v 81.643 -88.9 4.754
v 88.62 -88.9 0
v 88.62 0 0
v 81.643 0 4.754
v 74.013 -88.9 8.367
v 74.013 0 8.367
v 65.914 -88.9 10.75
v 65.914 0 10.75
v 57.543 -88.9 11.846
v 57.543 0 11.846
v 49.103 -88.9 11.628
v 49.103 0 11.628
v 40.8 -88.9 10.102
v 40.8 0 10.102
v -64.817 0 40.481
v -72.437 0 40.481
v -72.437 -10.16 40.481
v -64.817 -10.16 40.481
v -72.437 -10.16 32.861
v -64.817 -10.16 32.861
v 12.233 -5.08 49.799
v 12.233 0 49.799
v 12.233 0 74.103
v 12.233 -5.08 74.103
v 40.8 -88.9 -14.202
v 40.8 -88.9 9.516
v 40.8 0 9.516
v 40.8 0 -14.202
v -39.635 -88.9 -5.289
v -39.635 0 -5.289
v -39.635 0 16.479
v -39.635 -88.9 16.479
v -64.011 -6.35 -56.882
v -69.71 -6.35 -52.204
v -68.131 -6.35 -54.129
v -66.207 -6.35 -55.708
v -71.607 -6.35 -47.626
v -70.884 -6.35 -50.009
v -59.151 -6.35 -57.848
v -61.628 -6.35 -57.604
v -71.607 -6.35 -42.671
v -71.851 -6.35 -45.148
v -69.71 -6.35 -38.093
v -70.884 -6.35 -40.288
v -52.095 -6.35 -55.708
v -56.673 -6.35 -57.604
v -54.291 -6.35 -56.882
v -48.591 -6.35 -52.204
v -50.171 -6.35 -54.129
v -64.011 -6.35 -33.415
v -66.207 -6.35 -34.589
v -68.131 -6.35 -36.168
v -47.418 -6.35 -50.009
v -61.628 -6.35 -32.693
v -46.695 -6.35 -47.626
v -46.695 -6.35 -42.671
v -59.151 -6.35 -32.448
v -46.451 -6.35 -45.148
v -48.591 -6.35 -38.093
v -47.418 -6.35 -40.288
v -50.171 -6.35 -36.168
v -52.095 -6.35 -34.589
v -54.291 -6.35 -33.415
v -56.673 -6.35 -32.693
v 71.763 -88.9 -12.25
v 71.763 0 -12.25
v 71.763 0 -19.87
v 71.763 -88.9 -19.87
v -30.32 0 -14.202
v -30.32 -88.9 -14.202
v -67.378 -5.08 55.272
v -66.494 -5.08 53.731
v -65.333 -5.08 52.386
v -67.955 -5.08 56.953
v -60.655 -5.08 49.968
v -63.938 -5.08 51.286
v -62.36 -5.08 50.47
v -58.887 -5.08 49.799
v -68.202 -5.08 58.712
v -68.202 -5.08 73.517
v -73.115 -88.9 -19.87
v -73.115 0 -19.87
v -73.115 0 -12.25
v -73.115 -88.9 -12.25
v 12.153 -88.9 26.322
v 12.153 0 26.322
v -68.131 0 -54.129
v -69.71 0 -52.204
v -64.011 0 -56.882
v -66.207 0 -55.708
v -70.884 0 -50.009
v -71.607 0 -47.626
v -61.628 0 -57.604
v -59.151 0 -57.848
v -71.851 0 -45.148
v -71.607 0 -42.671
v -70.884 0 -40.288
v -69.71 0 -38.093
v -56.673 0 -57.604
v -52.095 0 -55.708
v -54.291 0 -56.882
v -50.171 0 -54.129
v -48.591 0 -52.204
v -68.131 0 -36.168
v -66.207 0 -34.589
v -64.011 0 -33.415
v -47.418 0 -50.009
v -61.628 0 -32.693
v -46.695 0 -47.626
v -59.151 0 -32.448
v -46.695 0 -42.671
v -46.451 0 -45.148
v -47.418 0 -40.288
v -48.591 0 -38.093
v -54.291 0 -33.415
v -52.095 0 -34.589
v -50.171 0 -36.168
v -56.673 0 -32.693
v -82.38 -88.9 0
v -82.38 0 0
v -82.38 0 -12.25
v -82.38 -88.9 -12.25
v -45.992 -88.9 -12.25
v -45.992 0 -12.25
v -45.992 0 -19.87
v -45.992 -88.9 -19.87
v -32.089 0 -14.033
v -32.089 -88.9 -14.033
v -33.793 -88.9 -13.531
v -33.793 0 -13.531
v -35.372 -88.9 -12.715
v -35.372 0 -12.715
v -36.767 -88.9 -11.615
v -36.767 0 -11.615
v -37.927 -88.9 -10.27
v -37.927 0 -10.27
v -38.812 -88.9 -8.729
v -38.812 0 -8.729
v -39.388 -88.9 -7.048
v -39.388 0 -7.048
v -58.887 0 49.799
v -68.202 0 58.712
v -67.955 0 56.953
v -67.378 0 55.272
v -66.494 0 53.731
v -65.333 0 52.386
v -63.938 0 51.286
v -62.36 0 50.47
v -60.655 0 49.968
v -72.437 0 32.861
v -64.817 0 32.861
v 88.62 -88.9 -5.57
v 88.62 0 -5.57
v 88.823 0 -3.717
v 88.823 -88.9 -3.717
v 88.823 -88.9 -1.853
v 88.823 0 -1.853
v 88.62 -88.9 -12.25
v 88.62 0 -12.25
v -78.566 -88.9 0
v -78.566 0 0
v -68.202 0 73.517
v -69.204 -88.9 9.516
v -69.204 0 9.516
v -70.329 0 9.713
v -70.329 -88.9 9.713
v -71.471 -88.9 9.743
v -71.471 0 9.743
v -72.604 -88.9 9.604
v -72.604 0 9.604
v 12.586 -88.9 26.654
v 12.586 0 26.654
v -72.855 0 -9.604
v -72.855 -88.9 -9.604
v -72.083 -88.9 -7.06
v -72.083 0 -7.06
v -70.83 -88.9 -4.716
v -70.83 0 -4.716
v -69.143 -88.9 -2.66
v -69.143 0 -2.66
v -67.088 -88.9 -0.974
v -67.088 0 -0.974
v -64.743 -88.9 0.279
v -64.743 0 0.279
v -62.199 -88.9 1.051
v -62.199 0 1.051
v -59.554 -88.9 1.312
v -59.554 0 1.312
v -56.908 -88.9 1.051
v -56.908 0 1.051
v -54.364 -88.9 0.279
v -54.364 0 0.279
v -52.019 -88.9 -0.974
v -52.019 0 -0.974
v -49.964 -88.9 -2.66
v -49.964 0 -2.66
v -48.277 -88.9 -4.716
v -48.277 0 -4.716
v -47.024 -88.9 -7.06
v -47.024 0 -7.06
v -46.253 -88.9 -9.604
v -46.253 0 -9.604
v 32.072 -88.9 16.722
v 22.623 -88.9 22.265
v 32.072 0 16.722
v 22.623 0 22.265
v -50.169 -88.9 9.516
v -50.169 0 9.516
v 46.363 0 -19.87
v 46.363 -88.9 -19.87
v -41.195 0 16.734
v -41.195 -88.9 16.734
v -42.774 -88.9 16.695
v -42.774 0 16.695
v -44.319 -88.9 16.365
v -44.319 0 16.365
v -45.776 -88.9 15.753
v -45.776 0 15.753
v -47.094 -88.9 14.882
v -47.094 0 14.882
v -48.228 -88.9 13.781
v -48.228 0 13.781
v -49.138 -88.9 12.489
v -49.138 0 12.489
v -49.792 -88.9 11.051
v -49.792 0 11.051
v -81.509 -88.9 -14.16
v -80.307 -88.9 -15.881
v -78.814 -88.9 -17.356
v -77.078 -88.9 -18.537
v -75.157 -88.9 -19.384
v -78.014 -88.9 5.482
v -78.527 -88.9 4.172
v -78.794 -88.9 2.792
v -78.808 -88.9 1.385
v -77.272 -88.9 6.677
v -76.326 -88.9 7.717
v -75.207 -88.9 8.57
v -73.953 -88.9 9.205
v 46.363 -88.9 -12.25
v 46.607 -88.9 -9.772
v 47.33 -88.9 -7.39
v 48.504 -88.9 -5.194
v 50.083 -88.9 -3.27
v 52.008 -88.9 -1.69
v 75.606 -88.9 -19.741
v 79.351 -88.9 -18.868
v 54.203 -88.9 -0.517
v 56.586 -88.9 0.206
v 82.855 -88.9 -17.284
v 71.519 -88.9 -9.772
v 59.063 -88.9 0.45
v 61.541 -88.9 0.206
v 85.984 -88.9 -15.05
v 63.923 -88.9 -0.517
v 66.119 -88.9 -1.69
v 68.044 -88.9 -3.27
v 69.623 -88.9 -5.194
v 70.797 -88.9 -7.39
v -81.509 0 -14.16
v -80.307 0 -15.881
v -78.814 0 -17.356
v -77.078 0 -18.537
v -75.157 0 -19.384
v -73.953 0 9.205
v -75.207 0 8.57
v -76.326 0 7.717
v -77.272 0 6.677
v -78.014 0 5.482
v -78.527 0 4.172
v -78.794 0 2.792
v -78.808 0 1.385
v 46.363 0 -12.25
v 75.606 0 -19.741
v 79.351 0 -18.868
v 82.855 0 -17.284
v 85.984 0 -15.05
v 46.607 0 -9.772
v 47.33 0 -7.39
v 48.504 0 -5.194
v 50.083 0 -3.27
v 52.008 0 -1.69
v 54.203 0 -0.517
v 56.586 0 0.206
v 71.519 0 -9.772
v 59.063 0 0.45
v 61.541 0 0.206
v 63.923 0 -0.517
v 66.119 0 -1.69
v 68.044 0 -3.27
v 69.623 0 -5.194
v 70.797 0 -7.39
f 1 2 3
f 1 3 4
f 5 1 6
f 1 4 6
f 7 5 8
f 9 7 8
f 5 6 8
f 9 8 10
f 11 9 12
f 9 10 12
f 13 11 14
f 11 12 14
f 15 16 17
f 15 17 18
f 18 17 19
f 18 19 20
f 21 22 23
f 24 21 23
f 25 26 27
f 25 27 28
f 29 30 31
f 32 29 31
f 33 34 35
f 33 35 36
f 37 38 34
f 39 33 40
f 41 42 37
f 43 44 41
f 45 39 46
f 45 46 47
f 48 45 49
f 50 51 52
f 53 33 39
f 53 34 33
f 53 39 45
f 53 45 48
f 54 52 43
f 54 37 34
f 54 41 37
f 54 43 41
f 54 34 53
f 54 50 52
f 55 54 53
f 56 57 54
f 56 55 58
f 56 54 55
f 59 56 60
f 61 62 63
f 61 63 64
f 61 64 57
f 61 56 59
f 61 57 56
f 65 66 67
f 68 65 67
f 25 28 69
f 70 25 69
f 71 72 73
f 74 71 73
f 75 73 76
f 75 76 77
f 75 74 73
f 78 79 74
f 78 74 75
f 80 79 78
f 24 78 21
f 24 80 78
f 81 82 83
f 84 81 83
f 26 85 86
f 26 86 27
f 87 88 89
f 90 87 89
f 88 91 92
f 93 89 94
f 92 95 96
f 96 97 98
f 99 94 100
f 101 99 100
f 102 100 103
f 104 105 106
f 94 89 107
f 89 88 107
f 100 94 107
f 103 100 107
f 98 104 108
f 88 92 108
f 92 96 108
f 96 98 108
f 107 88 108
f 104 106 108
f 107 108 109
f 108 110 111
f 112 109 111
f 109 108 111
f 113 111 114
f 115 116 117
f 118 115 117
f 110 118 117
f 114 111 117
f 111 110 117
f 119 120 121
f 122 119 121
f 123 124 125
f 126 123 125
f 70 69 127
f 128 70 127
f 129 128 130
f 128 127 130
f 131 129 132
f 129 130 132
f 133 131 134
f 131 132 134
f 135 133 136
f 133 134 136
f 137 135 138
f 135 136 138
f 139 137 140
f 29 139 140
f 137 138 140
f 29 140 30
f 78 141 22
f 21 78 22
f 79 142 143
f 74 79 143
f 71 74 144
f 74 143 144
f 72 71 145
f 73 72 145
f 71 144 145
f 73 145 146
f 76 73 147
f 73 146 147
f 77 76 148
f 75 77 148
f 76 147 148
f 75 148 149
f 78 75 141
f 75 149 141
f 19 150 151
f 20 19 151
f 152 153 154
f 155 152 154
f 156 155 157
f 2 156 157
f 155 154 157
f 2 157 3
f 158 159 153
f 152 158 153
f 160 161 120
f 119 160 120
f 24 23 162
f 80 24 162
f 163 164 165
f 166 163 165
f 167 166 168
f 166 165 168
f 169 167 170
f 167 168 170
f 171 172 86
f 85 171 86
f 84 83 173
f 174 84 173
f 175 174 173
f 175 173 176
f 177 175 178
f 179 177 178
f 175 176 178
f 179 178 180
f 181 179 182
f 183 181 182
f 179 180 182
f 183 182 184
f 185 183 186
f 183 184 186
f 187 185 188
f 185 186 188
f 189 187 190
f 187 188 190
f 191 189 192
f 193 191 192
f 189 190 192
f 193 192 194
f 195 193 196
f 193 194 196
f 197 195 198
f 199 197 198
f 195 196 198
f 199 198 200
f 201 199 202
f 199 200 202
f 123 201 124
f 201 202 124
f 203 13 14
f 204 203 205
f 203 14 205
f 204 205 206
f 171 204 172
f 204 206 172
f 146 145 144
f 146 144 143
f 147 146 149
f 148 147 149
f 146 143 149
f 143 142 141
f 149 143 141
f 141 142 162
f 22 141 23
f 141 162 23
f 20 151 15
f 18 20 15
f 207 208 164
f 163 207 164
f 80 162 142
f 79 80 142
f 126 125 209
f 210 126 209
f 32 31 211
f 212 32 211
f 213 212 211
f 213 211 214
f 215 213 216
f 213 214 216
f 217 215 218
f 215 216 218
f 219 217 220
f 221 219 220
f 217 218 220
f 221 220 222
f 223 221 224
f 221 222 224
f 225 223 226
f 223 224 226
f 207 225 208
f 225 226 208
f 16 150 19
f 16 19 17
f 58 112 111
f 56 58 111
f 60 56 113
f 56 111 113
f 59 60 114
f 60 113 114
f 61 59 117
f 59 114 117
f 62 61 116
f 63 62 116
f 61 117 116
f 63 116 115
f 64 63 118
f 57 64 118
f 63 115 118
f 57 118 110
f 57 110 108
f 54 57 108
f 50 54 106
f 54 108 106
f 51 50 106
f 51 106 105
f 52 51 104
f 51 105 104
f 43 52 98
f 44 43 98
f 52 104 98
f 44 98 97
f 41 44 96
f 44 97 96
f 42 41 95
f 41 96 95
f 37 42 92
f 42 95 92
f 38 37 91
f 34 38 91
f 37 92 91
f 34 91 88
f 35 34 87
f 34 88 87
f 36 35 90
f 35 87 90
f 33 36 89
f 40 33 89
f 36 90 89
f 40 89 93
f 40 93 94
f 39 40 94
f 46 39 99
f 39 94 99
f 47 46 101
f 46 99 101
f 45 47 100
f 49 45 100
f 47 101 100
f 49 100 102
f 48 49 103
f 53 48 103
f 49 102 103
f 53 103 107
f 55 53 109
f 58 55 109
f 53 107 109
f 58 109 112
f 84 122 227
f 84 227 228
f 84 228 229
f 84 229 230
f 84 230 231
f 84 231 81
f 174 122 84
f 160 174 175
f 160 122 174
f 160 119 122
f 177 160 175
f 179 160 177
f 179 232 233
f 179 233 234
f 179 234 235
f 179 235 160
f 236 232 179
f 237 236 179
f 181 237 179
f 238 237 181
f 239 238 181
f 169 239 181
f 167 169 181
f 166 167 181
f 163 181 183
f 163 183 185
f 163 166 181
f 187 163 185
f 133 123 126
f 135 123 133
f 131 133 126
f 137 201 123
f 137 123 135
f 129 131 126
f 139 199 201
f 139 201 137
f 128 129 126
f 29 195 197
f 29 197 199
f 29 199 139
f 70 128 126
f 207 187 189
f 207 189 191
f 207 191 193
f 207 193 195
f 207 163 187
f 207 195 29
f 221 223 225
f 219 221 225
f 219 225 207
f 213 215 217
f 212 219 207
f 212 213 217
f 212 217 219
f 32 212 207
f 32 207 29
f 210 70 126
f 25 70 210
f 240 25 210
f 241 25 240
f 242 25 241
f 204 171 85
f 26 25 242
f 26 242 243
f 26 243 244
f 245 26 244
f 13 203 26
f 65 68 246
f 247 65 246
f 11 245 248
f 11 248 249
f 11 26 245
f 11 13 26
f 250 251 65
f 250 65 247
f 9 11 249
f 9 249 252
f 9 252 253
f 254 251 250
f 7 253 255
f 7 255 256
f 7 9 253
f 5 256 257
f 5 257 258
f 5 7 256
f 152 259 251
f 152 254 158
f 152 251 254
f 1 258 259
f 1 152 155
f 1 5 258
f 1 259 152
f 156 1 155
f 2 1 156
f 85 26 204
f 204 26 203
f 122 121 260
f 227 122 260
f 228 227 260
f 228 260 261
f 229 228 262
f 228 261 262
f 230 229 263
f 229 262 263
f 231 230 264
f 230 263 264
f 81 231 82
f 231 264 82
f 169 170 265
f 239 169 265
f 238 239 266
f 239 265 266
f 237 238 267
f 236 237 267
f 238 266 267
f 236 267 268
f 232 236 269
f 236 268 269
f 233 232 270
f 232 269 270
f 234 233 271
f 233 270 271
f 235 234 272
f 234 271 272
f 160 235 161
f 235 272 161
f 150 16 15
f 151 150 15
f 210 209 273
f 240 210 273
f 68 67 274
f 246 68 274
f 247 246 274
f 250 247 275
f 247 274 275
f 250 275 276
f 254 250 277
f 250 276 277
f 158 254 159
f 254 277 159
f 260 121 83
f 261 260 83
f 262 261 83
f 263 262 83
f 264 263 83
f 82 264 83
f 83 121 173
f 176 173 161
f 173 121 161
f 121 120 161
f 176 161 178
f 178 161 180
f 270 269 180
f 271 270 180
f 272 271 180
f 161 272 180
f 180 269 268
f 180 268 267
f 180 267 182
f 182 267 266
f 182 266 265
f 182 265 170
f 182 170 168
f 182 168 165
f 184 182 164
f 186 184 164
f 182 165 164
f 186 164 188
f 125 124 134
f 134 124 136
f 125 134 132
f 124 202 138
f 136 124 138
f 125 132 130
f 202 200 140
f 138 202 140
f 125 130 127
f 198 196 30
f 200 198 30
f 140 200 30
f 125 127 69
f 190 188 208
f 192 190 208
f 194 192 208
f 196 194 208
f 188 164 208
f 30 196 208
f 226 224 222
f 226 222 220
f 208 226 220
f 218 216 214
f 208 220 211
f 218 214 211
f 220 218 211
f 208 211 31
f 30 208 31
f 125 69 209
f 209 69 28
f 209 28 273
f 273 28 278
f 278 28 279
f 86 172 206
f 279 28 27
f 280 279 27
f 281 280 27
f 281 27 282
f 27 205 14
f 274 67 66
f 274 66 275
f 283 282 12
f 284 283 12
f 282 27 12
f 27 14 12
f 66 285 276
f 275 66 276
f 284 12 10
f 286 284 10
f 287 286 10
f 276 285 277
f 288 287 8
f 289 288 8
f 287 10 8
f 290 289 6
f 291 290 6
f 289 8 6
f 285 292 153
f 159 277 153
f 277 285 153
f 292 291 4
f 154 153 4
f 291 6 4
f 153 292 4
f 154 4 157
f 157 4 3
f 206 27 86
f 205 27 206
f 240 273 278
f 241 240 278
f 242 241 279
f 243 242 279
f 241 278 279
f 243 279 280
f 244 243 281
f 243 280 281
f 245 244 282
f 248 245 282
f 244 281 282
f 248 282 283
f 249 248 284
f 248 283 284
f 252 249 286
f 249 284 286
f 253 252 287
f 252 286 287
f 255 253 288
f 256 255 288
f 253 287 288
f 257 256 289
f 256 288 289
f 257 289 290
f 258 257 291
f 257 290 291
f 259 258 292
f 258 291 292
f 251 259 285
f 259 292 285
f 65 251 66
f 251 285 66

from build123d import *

# Parameters (mm, degrees)
F1_DEPTH = 88.9
F3_DEPTH = 5.08
F4_R     = 12.7
F5_DEPTH = 6.35
F6_W     = 7.62
F6_H     = 7.62
F7_DEPTH = 10.16


with BuildPart() as f1:
    # F0 (on Front) → F1 (new body)
    with BuildSketch(Plane.XZ):
        with BuildLine():
            ThreePointArc((-82.37978, -12.250033), (-78.813533, -17.356135), (-73.115226, -19.870033))
            Line((-73.115226, -19.870033), (-73.115226, -12.250033))
            ThreePointArc((-73.115226, -12.250033), (-59.553572, 1.31162), (-45.991919, -12.250033))
            Line((-45.991919, -12.250033), (-45.991919, -19.870033))
            Line((-45.991919, -19.870033), (46.363413, -19.870033))
            Line((46.363413, -19.870033), (46.363413, -12.250033))
            ThreePointArc((46.363413, -12.250033), (59.063413, 0.449967), (71.763413, -12.250033))
            Line((71.763413, -12.250033), (71.763413, -19.870033))
            ThreePointArc((71.763413, -19.870033), (81.14185, -18.161995), (88.619895, -12.250033))
            Line((88.619895, -12.250033), (88.619895, -5.570058))
            Line((88.619895, -5.570058), (88.619895, 0))
            ThreePointArc((88.619895, 0), (65.913754, 10.749941), (40.7998, 10.102283))
            Line((40.7998, 10.102283), (40.7998, 9.51627))
            Line((40.7998, 9.51627), (40.7998, -14.202342))
            Line((40.7998, -14.202342), (-30.3202, -14.202342))
            ThreePointArc((-30.3202, -14.202342), (-36.766504, -11.614961), (-39.635142, -5.288801))
            Line((-39.635142, -5.288801), (-39.635142, 9.51627))
            Line((-39.635142, 9.51627), (-50.168831, 9.51627))
            Line((-50.168831, 9.51627), (-69.20395, 9.51627))
            Line((-69.20395, 9.51627), (-71.472034, 9.51627))
            ThreePointArc((-71.472034, 9.51627), (-72.036763, 9.57663), (-72.604074, 9.603507))
            ThreePointArc((-72.604074, 9.603507), (-77.669849, 6.096007), (-78.566145, 0))
            Line((-78.566145, 0), (-82.37978, 0))
            Line((-82.37978, 0), (-82.37978, -12.250033))
        make_face()
        with BuildLine():
            ThreePointArc((-69.20395, 9.51627), (-70.899158, 9.749071), (-72.604074, 9.603507))
            ThreePointArc((-72.604074, 9.603507), (-72.036763, 9.57663), (-71.472034, 9.51627))
            Line((-71.472034, 9.51627), (-69.20395, 9.51627))
        make_face()
        with BuildLine():
            ThreePointArc((-39.635142, 16.478934), (-46.45556, 15.347976), (-50.168831, 9.51627))
            Line((-50.168831, 9.51627), (-39.635142, 9.51627))
            Line((-39.635142, 9.51627), (-39.635142, 16.478934))
        make_face()
        with BuildLine():
            Line((88.619895, 0), (88.619895, -5.570058))
            ThreePointArc((88.619895, -5.570058), (88.848418, -2.785029), (88.619895, 0))
        make_face()
        with BuildLine():
            Line((40.7998, 9.51627), (40.7998, 10.102283))
            ThreePointArc((40.7998, 10.102283), (27.42958, 19.633614), (12.586275, 26.653968))
            Line((12.586275, 26.653968), (12.153219, 26.322011))
            Line((12.153219, 26.322011), (40.7998, 9.51627))
        make_face()
    extrude(amount=F1_DEPTH)


with BuildPart() as f3:
    # F2 (on Front) → F3 (new body)
    with BuildSketch(Plane.XZ):
        with BuildLine():
            Line((12.233235, 74.103309), (-68.201707, 73.517296))
            Line((-68.201707, 73.517296), (-68.201707, 58.712226))
            ThreePointArc((-68.201707, 58.712226), (-65.333069, 52.386065), (-58.886765, 49.798684))
            Line((-58.886765, 49.798684), (12.233235, 49.798684))
            Line((12.233235, 49.798684), (12.233235, 74.103309))
        make_face()
    extrude(amount=F3_DEPTH)


with BuildPart() as f5:
    # F4 (on Front) → F5 (new body)
    with BuildSketch(Plane.XZ):
        with Locations((-59.1508, -45.148499)):
            Circle(F4_R)
    extrude(amount=F5_DEPTH)


with BuildPart() as f7:
    # F6 (on Front) → F7 (new body)
    with BuildSketch(Plane.XZ):
        with Locations((-68.627257, 36.671251)):
            Rectangle(F6_W, F6_H)
    extrude(amount=F7_DEPTH)


solid = Compound([f1.part, f3.part, f5.part, f7.part])
